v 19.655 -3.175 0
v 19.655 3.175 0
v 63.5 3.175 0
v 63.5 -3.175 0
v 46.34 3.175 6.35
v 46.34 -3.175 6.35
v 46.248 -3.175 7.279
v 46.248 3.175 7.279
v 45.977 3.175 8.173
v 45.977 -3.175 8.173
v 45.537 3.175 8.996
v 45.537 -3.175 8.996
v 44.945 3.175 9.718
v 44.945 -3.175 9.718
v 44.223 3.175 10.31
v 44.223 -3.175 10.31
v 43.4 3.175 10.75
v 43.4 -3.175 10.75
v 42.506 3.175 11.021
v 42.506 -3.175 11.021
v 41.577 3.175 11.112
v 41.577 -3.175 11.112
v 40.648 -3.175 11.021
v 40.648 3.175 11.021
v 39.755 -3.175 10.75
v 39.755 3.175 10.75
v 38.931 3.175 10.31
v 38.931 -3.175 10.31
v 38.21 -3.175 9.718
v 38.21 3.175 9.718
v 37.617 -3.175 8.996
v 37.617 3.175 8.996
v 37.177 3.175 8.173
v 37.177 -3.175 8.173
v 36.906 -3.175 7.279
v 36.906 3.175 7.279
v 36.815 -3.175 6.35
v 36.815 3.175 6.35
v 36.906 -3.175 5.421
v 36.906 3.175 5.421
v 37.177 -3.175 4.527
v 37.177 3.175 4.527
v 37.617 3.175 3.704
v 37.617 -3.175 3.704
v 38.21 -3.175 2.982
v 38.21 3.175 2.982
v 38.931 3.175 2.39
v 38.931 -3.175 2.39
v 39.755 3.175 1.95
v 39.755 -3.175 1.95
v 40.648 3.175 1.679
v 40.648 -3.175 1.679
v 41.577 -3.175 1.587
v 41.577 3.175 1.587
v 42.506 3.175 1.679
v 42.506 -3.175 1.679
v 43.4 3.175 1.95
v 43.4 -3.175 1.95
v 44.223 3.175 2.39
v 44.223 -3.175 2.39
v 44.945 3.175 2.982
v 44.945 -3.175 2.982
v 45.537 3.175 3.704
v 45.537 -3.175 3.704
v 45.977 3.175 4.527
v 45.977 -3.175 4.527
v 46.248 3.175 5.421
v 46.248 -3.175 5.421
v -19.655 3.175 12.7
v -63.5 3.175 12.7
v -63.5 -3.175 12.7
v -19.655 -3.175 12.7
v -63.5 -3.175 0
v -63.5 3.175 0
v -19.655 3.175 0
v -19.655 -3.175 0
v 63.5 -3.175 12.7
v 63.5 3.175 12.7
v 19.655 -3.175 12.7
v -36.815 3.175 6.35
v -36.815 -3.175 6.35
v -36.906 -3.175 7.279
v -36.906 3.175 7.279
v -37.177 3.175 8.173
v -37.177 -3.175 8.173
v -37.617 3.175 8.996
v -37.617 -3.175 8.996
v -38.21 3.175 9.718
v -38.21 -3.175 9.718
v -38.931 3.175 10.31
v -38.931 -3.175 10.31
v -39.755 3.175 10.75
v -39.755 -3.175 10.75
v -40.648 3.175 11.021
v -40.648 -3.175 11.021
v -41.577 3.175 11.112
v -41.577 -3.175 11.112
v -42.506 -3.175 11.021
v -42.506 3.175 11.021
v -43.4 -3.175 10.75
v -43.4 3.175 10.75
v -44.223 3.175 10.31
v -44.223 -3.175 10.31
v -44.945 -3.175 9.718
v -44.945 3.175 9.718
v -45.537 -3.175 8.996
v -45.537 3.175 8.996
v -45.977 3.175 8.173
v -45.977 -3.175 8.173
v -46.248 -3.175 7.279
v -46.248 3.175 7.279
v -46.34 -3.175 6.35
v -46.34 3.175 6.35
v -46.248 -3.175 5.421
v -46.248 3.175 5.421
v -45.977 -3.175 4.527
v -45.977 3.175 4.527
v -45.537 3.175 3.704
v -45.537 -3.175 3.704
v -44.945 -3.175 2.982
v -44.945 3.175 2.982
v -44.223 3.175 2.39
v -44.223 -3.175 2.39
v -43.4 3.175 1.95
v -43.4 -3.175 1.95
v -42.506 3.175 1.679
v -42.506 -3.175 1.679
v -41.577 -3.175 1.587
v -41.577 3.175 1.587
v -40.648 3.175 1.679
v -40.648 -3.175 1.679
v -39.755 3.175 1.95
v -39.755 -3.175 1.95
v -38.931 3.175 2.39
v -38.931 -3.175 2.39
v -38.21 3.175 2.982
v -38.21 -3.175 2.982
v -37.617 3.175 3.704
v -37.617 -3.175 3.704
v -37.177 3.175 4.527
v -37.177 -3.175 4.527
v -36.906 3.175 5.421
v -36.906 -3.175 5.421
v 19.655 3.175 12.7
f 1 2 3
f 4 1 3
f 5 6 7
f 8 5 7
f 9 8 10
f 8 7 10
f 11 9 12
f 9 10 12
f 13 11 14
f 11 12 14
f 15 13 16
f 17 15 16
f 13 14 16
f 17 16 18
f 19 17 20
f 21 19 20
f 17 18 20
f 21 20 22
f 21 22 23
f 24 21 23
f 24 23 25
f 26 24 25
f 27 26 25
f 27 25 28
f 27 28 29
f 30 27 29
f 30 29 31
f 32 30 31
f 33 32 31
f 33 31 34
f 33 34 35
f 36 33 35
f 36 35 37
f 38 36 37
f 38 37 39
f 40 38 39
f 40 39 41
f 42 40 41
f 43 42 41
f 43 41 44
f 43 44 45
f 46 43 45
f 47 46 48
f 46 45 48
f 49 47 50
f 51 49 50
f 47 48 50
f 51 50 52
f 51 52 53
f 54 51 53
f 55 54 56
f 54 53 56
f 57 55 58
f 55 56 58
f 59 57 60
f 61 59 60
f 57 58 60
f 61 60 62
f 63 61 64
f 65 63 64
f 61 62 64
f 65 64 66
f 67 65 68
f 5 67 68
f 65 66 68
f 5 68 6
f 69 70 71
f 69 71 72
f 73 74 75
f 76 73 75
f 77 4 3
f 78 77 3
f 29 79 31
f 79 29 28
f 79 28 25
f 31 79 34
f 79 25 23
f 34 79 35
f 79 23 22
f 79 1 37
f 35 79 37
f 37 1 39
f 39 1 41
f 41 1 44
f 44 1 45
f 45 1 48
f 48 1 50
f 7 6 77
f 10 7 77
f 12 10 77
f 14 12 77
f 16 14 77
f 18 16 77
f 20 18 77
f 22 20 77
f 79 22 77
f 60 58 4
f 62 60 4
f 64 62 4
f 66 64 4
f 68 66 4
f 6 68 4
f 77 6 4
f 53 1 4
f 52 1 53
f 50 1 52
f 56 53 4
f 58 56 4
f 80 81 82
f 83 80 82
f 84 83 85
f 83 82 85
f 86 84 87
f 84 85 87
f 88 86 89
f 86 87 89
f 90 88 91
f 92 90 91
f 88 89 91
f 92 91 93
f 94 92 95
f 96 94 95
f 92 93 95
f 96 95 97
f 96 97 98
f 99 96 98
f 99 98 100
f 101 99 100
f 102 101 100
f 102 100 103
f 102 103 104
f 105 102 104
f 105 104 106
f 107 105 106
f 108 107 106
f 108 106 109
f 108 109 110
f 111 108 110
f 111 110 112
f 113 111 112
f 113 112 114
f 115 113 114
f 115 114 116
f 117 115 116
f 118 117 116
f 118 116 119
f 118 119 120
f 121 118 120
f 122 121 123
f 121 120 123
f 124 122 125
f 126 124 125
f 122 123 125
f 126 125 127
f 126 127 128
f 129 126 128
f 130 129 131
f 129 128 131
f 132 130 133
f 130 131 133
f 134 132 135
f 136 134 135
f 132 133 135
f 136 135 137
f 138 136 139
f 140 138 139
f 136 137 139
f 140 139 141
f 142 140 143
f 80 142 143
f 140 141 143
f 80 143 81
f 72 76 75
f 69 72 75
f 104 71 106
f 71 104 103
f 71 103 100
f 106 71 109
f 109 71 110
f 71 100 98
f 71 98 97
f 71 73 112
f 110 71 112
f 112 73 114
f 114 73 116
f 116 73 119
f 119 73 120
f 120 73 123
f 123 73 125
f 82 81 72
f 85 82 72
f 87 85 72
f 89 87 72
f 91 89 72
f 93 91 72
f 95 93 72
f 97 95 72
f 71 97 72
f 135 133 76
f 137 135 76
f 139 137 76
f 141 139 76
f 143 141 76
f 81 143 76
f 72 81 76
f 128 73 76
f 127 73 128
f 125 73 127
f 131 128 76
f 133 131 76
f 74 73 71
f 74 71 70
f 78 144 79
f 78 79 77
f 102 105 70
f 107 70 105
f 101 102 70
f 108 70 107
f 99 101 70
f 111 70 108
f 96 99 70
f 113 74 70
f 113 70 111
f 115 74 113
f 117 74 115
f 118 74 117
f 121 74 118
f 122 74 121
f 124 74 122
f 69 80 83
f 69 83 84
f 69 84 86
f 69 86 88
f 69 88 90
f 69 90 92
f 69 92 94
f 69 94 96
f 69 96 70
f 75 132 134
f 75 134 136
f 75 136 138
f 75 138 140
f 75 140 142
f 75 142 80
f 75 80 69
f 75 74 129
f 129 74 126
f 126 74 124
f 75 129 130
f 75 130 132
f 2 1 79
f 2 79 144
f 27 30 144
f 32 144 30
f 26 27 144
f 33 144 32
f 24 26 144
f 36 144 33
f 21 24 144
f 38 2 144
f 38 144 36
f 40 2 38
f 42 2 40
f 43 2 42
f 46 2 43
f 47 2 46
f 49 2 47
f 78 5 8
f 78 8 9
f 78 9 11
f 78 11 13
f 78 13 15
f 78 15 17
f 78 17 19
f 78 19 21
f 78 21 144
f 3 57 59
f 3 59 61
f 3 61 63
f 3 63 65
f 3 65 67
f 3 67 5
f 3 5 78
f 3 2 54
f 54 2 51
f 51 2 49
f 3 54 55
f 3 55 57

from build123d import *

# Parameters (mm, degrees)
F0_W     = 43.845368
F0_H     = 6.35
F1_DEPTH = 12.7
F2_R     = 4.7625
F3_DEPTH = 25.4


with BuildPart() as f1:
    # F0 (on Top) → F1 (new body)
    with BuildSketch(Plane.XY):
        with Locations((-41.577316, 0)):
            Rectangle(F0_W, F0_H)
        with Locations((41.577316, 0)):
            Rectangle(F0_W, F0_H)
    extrude(amount=F1_DEPTH)

    # F2 (on face) → F3 (cut)
    with BuildSketch(Plane.XZ.offset(3.175)):
        with Locations((-41.577316, 6.35)):
            Circle(F2_R)
        with Locations((41.577316, 6.35)):
            Circle(F2_R)
    extrude(amount=-F3_DEPTH, mode=Mode.SUBTRACT)


solid = f1.part
